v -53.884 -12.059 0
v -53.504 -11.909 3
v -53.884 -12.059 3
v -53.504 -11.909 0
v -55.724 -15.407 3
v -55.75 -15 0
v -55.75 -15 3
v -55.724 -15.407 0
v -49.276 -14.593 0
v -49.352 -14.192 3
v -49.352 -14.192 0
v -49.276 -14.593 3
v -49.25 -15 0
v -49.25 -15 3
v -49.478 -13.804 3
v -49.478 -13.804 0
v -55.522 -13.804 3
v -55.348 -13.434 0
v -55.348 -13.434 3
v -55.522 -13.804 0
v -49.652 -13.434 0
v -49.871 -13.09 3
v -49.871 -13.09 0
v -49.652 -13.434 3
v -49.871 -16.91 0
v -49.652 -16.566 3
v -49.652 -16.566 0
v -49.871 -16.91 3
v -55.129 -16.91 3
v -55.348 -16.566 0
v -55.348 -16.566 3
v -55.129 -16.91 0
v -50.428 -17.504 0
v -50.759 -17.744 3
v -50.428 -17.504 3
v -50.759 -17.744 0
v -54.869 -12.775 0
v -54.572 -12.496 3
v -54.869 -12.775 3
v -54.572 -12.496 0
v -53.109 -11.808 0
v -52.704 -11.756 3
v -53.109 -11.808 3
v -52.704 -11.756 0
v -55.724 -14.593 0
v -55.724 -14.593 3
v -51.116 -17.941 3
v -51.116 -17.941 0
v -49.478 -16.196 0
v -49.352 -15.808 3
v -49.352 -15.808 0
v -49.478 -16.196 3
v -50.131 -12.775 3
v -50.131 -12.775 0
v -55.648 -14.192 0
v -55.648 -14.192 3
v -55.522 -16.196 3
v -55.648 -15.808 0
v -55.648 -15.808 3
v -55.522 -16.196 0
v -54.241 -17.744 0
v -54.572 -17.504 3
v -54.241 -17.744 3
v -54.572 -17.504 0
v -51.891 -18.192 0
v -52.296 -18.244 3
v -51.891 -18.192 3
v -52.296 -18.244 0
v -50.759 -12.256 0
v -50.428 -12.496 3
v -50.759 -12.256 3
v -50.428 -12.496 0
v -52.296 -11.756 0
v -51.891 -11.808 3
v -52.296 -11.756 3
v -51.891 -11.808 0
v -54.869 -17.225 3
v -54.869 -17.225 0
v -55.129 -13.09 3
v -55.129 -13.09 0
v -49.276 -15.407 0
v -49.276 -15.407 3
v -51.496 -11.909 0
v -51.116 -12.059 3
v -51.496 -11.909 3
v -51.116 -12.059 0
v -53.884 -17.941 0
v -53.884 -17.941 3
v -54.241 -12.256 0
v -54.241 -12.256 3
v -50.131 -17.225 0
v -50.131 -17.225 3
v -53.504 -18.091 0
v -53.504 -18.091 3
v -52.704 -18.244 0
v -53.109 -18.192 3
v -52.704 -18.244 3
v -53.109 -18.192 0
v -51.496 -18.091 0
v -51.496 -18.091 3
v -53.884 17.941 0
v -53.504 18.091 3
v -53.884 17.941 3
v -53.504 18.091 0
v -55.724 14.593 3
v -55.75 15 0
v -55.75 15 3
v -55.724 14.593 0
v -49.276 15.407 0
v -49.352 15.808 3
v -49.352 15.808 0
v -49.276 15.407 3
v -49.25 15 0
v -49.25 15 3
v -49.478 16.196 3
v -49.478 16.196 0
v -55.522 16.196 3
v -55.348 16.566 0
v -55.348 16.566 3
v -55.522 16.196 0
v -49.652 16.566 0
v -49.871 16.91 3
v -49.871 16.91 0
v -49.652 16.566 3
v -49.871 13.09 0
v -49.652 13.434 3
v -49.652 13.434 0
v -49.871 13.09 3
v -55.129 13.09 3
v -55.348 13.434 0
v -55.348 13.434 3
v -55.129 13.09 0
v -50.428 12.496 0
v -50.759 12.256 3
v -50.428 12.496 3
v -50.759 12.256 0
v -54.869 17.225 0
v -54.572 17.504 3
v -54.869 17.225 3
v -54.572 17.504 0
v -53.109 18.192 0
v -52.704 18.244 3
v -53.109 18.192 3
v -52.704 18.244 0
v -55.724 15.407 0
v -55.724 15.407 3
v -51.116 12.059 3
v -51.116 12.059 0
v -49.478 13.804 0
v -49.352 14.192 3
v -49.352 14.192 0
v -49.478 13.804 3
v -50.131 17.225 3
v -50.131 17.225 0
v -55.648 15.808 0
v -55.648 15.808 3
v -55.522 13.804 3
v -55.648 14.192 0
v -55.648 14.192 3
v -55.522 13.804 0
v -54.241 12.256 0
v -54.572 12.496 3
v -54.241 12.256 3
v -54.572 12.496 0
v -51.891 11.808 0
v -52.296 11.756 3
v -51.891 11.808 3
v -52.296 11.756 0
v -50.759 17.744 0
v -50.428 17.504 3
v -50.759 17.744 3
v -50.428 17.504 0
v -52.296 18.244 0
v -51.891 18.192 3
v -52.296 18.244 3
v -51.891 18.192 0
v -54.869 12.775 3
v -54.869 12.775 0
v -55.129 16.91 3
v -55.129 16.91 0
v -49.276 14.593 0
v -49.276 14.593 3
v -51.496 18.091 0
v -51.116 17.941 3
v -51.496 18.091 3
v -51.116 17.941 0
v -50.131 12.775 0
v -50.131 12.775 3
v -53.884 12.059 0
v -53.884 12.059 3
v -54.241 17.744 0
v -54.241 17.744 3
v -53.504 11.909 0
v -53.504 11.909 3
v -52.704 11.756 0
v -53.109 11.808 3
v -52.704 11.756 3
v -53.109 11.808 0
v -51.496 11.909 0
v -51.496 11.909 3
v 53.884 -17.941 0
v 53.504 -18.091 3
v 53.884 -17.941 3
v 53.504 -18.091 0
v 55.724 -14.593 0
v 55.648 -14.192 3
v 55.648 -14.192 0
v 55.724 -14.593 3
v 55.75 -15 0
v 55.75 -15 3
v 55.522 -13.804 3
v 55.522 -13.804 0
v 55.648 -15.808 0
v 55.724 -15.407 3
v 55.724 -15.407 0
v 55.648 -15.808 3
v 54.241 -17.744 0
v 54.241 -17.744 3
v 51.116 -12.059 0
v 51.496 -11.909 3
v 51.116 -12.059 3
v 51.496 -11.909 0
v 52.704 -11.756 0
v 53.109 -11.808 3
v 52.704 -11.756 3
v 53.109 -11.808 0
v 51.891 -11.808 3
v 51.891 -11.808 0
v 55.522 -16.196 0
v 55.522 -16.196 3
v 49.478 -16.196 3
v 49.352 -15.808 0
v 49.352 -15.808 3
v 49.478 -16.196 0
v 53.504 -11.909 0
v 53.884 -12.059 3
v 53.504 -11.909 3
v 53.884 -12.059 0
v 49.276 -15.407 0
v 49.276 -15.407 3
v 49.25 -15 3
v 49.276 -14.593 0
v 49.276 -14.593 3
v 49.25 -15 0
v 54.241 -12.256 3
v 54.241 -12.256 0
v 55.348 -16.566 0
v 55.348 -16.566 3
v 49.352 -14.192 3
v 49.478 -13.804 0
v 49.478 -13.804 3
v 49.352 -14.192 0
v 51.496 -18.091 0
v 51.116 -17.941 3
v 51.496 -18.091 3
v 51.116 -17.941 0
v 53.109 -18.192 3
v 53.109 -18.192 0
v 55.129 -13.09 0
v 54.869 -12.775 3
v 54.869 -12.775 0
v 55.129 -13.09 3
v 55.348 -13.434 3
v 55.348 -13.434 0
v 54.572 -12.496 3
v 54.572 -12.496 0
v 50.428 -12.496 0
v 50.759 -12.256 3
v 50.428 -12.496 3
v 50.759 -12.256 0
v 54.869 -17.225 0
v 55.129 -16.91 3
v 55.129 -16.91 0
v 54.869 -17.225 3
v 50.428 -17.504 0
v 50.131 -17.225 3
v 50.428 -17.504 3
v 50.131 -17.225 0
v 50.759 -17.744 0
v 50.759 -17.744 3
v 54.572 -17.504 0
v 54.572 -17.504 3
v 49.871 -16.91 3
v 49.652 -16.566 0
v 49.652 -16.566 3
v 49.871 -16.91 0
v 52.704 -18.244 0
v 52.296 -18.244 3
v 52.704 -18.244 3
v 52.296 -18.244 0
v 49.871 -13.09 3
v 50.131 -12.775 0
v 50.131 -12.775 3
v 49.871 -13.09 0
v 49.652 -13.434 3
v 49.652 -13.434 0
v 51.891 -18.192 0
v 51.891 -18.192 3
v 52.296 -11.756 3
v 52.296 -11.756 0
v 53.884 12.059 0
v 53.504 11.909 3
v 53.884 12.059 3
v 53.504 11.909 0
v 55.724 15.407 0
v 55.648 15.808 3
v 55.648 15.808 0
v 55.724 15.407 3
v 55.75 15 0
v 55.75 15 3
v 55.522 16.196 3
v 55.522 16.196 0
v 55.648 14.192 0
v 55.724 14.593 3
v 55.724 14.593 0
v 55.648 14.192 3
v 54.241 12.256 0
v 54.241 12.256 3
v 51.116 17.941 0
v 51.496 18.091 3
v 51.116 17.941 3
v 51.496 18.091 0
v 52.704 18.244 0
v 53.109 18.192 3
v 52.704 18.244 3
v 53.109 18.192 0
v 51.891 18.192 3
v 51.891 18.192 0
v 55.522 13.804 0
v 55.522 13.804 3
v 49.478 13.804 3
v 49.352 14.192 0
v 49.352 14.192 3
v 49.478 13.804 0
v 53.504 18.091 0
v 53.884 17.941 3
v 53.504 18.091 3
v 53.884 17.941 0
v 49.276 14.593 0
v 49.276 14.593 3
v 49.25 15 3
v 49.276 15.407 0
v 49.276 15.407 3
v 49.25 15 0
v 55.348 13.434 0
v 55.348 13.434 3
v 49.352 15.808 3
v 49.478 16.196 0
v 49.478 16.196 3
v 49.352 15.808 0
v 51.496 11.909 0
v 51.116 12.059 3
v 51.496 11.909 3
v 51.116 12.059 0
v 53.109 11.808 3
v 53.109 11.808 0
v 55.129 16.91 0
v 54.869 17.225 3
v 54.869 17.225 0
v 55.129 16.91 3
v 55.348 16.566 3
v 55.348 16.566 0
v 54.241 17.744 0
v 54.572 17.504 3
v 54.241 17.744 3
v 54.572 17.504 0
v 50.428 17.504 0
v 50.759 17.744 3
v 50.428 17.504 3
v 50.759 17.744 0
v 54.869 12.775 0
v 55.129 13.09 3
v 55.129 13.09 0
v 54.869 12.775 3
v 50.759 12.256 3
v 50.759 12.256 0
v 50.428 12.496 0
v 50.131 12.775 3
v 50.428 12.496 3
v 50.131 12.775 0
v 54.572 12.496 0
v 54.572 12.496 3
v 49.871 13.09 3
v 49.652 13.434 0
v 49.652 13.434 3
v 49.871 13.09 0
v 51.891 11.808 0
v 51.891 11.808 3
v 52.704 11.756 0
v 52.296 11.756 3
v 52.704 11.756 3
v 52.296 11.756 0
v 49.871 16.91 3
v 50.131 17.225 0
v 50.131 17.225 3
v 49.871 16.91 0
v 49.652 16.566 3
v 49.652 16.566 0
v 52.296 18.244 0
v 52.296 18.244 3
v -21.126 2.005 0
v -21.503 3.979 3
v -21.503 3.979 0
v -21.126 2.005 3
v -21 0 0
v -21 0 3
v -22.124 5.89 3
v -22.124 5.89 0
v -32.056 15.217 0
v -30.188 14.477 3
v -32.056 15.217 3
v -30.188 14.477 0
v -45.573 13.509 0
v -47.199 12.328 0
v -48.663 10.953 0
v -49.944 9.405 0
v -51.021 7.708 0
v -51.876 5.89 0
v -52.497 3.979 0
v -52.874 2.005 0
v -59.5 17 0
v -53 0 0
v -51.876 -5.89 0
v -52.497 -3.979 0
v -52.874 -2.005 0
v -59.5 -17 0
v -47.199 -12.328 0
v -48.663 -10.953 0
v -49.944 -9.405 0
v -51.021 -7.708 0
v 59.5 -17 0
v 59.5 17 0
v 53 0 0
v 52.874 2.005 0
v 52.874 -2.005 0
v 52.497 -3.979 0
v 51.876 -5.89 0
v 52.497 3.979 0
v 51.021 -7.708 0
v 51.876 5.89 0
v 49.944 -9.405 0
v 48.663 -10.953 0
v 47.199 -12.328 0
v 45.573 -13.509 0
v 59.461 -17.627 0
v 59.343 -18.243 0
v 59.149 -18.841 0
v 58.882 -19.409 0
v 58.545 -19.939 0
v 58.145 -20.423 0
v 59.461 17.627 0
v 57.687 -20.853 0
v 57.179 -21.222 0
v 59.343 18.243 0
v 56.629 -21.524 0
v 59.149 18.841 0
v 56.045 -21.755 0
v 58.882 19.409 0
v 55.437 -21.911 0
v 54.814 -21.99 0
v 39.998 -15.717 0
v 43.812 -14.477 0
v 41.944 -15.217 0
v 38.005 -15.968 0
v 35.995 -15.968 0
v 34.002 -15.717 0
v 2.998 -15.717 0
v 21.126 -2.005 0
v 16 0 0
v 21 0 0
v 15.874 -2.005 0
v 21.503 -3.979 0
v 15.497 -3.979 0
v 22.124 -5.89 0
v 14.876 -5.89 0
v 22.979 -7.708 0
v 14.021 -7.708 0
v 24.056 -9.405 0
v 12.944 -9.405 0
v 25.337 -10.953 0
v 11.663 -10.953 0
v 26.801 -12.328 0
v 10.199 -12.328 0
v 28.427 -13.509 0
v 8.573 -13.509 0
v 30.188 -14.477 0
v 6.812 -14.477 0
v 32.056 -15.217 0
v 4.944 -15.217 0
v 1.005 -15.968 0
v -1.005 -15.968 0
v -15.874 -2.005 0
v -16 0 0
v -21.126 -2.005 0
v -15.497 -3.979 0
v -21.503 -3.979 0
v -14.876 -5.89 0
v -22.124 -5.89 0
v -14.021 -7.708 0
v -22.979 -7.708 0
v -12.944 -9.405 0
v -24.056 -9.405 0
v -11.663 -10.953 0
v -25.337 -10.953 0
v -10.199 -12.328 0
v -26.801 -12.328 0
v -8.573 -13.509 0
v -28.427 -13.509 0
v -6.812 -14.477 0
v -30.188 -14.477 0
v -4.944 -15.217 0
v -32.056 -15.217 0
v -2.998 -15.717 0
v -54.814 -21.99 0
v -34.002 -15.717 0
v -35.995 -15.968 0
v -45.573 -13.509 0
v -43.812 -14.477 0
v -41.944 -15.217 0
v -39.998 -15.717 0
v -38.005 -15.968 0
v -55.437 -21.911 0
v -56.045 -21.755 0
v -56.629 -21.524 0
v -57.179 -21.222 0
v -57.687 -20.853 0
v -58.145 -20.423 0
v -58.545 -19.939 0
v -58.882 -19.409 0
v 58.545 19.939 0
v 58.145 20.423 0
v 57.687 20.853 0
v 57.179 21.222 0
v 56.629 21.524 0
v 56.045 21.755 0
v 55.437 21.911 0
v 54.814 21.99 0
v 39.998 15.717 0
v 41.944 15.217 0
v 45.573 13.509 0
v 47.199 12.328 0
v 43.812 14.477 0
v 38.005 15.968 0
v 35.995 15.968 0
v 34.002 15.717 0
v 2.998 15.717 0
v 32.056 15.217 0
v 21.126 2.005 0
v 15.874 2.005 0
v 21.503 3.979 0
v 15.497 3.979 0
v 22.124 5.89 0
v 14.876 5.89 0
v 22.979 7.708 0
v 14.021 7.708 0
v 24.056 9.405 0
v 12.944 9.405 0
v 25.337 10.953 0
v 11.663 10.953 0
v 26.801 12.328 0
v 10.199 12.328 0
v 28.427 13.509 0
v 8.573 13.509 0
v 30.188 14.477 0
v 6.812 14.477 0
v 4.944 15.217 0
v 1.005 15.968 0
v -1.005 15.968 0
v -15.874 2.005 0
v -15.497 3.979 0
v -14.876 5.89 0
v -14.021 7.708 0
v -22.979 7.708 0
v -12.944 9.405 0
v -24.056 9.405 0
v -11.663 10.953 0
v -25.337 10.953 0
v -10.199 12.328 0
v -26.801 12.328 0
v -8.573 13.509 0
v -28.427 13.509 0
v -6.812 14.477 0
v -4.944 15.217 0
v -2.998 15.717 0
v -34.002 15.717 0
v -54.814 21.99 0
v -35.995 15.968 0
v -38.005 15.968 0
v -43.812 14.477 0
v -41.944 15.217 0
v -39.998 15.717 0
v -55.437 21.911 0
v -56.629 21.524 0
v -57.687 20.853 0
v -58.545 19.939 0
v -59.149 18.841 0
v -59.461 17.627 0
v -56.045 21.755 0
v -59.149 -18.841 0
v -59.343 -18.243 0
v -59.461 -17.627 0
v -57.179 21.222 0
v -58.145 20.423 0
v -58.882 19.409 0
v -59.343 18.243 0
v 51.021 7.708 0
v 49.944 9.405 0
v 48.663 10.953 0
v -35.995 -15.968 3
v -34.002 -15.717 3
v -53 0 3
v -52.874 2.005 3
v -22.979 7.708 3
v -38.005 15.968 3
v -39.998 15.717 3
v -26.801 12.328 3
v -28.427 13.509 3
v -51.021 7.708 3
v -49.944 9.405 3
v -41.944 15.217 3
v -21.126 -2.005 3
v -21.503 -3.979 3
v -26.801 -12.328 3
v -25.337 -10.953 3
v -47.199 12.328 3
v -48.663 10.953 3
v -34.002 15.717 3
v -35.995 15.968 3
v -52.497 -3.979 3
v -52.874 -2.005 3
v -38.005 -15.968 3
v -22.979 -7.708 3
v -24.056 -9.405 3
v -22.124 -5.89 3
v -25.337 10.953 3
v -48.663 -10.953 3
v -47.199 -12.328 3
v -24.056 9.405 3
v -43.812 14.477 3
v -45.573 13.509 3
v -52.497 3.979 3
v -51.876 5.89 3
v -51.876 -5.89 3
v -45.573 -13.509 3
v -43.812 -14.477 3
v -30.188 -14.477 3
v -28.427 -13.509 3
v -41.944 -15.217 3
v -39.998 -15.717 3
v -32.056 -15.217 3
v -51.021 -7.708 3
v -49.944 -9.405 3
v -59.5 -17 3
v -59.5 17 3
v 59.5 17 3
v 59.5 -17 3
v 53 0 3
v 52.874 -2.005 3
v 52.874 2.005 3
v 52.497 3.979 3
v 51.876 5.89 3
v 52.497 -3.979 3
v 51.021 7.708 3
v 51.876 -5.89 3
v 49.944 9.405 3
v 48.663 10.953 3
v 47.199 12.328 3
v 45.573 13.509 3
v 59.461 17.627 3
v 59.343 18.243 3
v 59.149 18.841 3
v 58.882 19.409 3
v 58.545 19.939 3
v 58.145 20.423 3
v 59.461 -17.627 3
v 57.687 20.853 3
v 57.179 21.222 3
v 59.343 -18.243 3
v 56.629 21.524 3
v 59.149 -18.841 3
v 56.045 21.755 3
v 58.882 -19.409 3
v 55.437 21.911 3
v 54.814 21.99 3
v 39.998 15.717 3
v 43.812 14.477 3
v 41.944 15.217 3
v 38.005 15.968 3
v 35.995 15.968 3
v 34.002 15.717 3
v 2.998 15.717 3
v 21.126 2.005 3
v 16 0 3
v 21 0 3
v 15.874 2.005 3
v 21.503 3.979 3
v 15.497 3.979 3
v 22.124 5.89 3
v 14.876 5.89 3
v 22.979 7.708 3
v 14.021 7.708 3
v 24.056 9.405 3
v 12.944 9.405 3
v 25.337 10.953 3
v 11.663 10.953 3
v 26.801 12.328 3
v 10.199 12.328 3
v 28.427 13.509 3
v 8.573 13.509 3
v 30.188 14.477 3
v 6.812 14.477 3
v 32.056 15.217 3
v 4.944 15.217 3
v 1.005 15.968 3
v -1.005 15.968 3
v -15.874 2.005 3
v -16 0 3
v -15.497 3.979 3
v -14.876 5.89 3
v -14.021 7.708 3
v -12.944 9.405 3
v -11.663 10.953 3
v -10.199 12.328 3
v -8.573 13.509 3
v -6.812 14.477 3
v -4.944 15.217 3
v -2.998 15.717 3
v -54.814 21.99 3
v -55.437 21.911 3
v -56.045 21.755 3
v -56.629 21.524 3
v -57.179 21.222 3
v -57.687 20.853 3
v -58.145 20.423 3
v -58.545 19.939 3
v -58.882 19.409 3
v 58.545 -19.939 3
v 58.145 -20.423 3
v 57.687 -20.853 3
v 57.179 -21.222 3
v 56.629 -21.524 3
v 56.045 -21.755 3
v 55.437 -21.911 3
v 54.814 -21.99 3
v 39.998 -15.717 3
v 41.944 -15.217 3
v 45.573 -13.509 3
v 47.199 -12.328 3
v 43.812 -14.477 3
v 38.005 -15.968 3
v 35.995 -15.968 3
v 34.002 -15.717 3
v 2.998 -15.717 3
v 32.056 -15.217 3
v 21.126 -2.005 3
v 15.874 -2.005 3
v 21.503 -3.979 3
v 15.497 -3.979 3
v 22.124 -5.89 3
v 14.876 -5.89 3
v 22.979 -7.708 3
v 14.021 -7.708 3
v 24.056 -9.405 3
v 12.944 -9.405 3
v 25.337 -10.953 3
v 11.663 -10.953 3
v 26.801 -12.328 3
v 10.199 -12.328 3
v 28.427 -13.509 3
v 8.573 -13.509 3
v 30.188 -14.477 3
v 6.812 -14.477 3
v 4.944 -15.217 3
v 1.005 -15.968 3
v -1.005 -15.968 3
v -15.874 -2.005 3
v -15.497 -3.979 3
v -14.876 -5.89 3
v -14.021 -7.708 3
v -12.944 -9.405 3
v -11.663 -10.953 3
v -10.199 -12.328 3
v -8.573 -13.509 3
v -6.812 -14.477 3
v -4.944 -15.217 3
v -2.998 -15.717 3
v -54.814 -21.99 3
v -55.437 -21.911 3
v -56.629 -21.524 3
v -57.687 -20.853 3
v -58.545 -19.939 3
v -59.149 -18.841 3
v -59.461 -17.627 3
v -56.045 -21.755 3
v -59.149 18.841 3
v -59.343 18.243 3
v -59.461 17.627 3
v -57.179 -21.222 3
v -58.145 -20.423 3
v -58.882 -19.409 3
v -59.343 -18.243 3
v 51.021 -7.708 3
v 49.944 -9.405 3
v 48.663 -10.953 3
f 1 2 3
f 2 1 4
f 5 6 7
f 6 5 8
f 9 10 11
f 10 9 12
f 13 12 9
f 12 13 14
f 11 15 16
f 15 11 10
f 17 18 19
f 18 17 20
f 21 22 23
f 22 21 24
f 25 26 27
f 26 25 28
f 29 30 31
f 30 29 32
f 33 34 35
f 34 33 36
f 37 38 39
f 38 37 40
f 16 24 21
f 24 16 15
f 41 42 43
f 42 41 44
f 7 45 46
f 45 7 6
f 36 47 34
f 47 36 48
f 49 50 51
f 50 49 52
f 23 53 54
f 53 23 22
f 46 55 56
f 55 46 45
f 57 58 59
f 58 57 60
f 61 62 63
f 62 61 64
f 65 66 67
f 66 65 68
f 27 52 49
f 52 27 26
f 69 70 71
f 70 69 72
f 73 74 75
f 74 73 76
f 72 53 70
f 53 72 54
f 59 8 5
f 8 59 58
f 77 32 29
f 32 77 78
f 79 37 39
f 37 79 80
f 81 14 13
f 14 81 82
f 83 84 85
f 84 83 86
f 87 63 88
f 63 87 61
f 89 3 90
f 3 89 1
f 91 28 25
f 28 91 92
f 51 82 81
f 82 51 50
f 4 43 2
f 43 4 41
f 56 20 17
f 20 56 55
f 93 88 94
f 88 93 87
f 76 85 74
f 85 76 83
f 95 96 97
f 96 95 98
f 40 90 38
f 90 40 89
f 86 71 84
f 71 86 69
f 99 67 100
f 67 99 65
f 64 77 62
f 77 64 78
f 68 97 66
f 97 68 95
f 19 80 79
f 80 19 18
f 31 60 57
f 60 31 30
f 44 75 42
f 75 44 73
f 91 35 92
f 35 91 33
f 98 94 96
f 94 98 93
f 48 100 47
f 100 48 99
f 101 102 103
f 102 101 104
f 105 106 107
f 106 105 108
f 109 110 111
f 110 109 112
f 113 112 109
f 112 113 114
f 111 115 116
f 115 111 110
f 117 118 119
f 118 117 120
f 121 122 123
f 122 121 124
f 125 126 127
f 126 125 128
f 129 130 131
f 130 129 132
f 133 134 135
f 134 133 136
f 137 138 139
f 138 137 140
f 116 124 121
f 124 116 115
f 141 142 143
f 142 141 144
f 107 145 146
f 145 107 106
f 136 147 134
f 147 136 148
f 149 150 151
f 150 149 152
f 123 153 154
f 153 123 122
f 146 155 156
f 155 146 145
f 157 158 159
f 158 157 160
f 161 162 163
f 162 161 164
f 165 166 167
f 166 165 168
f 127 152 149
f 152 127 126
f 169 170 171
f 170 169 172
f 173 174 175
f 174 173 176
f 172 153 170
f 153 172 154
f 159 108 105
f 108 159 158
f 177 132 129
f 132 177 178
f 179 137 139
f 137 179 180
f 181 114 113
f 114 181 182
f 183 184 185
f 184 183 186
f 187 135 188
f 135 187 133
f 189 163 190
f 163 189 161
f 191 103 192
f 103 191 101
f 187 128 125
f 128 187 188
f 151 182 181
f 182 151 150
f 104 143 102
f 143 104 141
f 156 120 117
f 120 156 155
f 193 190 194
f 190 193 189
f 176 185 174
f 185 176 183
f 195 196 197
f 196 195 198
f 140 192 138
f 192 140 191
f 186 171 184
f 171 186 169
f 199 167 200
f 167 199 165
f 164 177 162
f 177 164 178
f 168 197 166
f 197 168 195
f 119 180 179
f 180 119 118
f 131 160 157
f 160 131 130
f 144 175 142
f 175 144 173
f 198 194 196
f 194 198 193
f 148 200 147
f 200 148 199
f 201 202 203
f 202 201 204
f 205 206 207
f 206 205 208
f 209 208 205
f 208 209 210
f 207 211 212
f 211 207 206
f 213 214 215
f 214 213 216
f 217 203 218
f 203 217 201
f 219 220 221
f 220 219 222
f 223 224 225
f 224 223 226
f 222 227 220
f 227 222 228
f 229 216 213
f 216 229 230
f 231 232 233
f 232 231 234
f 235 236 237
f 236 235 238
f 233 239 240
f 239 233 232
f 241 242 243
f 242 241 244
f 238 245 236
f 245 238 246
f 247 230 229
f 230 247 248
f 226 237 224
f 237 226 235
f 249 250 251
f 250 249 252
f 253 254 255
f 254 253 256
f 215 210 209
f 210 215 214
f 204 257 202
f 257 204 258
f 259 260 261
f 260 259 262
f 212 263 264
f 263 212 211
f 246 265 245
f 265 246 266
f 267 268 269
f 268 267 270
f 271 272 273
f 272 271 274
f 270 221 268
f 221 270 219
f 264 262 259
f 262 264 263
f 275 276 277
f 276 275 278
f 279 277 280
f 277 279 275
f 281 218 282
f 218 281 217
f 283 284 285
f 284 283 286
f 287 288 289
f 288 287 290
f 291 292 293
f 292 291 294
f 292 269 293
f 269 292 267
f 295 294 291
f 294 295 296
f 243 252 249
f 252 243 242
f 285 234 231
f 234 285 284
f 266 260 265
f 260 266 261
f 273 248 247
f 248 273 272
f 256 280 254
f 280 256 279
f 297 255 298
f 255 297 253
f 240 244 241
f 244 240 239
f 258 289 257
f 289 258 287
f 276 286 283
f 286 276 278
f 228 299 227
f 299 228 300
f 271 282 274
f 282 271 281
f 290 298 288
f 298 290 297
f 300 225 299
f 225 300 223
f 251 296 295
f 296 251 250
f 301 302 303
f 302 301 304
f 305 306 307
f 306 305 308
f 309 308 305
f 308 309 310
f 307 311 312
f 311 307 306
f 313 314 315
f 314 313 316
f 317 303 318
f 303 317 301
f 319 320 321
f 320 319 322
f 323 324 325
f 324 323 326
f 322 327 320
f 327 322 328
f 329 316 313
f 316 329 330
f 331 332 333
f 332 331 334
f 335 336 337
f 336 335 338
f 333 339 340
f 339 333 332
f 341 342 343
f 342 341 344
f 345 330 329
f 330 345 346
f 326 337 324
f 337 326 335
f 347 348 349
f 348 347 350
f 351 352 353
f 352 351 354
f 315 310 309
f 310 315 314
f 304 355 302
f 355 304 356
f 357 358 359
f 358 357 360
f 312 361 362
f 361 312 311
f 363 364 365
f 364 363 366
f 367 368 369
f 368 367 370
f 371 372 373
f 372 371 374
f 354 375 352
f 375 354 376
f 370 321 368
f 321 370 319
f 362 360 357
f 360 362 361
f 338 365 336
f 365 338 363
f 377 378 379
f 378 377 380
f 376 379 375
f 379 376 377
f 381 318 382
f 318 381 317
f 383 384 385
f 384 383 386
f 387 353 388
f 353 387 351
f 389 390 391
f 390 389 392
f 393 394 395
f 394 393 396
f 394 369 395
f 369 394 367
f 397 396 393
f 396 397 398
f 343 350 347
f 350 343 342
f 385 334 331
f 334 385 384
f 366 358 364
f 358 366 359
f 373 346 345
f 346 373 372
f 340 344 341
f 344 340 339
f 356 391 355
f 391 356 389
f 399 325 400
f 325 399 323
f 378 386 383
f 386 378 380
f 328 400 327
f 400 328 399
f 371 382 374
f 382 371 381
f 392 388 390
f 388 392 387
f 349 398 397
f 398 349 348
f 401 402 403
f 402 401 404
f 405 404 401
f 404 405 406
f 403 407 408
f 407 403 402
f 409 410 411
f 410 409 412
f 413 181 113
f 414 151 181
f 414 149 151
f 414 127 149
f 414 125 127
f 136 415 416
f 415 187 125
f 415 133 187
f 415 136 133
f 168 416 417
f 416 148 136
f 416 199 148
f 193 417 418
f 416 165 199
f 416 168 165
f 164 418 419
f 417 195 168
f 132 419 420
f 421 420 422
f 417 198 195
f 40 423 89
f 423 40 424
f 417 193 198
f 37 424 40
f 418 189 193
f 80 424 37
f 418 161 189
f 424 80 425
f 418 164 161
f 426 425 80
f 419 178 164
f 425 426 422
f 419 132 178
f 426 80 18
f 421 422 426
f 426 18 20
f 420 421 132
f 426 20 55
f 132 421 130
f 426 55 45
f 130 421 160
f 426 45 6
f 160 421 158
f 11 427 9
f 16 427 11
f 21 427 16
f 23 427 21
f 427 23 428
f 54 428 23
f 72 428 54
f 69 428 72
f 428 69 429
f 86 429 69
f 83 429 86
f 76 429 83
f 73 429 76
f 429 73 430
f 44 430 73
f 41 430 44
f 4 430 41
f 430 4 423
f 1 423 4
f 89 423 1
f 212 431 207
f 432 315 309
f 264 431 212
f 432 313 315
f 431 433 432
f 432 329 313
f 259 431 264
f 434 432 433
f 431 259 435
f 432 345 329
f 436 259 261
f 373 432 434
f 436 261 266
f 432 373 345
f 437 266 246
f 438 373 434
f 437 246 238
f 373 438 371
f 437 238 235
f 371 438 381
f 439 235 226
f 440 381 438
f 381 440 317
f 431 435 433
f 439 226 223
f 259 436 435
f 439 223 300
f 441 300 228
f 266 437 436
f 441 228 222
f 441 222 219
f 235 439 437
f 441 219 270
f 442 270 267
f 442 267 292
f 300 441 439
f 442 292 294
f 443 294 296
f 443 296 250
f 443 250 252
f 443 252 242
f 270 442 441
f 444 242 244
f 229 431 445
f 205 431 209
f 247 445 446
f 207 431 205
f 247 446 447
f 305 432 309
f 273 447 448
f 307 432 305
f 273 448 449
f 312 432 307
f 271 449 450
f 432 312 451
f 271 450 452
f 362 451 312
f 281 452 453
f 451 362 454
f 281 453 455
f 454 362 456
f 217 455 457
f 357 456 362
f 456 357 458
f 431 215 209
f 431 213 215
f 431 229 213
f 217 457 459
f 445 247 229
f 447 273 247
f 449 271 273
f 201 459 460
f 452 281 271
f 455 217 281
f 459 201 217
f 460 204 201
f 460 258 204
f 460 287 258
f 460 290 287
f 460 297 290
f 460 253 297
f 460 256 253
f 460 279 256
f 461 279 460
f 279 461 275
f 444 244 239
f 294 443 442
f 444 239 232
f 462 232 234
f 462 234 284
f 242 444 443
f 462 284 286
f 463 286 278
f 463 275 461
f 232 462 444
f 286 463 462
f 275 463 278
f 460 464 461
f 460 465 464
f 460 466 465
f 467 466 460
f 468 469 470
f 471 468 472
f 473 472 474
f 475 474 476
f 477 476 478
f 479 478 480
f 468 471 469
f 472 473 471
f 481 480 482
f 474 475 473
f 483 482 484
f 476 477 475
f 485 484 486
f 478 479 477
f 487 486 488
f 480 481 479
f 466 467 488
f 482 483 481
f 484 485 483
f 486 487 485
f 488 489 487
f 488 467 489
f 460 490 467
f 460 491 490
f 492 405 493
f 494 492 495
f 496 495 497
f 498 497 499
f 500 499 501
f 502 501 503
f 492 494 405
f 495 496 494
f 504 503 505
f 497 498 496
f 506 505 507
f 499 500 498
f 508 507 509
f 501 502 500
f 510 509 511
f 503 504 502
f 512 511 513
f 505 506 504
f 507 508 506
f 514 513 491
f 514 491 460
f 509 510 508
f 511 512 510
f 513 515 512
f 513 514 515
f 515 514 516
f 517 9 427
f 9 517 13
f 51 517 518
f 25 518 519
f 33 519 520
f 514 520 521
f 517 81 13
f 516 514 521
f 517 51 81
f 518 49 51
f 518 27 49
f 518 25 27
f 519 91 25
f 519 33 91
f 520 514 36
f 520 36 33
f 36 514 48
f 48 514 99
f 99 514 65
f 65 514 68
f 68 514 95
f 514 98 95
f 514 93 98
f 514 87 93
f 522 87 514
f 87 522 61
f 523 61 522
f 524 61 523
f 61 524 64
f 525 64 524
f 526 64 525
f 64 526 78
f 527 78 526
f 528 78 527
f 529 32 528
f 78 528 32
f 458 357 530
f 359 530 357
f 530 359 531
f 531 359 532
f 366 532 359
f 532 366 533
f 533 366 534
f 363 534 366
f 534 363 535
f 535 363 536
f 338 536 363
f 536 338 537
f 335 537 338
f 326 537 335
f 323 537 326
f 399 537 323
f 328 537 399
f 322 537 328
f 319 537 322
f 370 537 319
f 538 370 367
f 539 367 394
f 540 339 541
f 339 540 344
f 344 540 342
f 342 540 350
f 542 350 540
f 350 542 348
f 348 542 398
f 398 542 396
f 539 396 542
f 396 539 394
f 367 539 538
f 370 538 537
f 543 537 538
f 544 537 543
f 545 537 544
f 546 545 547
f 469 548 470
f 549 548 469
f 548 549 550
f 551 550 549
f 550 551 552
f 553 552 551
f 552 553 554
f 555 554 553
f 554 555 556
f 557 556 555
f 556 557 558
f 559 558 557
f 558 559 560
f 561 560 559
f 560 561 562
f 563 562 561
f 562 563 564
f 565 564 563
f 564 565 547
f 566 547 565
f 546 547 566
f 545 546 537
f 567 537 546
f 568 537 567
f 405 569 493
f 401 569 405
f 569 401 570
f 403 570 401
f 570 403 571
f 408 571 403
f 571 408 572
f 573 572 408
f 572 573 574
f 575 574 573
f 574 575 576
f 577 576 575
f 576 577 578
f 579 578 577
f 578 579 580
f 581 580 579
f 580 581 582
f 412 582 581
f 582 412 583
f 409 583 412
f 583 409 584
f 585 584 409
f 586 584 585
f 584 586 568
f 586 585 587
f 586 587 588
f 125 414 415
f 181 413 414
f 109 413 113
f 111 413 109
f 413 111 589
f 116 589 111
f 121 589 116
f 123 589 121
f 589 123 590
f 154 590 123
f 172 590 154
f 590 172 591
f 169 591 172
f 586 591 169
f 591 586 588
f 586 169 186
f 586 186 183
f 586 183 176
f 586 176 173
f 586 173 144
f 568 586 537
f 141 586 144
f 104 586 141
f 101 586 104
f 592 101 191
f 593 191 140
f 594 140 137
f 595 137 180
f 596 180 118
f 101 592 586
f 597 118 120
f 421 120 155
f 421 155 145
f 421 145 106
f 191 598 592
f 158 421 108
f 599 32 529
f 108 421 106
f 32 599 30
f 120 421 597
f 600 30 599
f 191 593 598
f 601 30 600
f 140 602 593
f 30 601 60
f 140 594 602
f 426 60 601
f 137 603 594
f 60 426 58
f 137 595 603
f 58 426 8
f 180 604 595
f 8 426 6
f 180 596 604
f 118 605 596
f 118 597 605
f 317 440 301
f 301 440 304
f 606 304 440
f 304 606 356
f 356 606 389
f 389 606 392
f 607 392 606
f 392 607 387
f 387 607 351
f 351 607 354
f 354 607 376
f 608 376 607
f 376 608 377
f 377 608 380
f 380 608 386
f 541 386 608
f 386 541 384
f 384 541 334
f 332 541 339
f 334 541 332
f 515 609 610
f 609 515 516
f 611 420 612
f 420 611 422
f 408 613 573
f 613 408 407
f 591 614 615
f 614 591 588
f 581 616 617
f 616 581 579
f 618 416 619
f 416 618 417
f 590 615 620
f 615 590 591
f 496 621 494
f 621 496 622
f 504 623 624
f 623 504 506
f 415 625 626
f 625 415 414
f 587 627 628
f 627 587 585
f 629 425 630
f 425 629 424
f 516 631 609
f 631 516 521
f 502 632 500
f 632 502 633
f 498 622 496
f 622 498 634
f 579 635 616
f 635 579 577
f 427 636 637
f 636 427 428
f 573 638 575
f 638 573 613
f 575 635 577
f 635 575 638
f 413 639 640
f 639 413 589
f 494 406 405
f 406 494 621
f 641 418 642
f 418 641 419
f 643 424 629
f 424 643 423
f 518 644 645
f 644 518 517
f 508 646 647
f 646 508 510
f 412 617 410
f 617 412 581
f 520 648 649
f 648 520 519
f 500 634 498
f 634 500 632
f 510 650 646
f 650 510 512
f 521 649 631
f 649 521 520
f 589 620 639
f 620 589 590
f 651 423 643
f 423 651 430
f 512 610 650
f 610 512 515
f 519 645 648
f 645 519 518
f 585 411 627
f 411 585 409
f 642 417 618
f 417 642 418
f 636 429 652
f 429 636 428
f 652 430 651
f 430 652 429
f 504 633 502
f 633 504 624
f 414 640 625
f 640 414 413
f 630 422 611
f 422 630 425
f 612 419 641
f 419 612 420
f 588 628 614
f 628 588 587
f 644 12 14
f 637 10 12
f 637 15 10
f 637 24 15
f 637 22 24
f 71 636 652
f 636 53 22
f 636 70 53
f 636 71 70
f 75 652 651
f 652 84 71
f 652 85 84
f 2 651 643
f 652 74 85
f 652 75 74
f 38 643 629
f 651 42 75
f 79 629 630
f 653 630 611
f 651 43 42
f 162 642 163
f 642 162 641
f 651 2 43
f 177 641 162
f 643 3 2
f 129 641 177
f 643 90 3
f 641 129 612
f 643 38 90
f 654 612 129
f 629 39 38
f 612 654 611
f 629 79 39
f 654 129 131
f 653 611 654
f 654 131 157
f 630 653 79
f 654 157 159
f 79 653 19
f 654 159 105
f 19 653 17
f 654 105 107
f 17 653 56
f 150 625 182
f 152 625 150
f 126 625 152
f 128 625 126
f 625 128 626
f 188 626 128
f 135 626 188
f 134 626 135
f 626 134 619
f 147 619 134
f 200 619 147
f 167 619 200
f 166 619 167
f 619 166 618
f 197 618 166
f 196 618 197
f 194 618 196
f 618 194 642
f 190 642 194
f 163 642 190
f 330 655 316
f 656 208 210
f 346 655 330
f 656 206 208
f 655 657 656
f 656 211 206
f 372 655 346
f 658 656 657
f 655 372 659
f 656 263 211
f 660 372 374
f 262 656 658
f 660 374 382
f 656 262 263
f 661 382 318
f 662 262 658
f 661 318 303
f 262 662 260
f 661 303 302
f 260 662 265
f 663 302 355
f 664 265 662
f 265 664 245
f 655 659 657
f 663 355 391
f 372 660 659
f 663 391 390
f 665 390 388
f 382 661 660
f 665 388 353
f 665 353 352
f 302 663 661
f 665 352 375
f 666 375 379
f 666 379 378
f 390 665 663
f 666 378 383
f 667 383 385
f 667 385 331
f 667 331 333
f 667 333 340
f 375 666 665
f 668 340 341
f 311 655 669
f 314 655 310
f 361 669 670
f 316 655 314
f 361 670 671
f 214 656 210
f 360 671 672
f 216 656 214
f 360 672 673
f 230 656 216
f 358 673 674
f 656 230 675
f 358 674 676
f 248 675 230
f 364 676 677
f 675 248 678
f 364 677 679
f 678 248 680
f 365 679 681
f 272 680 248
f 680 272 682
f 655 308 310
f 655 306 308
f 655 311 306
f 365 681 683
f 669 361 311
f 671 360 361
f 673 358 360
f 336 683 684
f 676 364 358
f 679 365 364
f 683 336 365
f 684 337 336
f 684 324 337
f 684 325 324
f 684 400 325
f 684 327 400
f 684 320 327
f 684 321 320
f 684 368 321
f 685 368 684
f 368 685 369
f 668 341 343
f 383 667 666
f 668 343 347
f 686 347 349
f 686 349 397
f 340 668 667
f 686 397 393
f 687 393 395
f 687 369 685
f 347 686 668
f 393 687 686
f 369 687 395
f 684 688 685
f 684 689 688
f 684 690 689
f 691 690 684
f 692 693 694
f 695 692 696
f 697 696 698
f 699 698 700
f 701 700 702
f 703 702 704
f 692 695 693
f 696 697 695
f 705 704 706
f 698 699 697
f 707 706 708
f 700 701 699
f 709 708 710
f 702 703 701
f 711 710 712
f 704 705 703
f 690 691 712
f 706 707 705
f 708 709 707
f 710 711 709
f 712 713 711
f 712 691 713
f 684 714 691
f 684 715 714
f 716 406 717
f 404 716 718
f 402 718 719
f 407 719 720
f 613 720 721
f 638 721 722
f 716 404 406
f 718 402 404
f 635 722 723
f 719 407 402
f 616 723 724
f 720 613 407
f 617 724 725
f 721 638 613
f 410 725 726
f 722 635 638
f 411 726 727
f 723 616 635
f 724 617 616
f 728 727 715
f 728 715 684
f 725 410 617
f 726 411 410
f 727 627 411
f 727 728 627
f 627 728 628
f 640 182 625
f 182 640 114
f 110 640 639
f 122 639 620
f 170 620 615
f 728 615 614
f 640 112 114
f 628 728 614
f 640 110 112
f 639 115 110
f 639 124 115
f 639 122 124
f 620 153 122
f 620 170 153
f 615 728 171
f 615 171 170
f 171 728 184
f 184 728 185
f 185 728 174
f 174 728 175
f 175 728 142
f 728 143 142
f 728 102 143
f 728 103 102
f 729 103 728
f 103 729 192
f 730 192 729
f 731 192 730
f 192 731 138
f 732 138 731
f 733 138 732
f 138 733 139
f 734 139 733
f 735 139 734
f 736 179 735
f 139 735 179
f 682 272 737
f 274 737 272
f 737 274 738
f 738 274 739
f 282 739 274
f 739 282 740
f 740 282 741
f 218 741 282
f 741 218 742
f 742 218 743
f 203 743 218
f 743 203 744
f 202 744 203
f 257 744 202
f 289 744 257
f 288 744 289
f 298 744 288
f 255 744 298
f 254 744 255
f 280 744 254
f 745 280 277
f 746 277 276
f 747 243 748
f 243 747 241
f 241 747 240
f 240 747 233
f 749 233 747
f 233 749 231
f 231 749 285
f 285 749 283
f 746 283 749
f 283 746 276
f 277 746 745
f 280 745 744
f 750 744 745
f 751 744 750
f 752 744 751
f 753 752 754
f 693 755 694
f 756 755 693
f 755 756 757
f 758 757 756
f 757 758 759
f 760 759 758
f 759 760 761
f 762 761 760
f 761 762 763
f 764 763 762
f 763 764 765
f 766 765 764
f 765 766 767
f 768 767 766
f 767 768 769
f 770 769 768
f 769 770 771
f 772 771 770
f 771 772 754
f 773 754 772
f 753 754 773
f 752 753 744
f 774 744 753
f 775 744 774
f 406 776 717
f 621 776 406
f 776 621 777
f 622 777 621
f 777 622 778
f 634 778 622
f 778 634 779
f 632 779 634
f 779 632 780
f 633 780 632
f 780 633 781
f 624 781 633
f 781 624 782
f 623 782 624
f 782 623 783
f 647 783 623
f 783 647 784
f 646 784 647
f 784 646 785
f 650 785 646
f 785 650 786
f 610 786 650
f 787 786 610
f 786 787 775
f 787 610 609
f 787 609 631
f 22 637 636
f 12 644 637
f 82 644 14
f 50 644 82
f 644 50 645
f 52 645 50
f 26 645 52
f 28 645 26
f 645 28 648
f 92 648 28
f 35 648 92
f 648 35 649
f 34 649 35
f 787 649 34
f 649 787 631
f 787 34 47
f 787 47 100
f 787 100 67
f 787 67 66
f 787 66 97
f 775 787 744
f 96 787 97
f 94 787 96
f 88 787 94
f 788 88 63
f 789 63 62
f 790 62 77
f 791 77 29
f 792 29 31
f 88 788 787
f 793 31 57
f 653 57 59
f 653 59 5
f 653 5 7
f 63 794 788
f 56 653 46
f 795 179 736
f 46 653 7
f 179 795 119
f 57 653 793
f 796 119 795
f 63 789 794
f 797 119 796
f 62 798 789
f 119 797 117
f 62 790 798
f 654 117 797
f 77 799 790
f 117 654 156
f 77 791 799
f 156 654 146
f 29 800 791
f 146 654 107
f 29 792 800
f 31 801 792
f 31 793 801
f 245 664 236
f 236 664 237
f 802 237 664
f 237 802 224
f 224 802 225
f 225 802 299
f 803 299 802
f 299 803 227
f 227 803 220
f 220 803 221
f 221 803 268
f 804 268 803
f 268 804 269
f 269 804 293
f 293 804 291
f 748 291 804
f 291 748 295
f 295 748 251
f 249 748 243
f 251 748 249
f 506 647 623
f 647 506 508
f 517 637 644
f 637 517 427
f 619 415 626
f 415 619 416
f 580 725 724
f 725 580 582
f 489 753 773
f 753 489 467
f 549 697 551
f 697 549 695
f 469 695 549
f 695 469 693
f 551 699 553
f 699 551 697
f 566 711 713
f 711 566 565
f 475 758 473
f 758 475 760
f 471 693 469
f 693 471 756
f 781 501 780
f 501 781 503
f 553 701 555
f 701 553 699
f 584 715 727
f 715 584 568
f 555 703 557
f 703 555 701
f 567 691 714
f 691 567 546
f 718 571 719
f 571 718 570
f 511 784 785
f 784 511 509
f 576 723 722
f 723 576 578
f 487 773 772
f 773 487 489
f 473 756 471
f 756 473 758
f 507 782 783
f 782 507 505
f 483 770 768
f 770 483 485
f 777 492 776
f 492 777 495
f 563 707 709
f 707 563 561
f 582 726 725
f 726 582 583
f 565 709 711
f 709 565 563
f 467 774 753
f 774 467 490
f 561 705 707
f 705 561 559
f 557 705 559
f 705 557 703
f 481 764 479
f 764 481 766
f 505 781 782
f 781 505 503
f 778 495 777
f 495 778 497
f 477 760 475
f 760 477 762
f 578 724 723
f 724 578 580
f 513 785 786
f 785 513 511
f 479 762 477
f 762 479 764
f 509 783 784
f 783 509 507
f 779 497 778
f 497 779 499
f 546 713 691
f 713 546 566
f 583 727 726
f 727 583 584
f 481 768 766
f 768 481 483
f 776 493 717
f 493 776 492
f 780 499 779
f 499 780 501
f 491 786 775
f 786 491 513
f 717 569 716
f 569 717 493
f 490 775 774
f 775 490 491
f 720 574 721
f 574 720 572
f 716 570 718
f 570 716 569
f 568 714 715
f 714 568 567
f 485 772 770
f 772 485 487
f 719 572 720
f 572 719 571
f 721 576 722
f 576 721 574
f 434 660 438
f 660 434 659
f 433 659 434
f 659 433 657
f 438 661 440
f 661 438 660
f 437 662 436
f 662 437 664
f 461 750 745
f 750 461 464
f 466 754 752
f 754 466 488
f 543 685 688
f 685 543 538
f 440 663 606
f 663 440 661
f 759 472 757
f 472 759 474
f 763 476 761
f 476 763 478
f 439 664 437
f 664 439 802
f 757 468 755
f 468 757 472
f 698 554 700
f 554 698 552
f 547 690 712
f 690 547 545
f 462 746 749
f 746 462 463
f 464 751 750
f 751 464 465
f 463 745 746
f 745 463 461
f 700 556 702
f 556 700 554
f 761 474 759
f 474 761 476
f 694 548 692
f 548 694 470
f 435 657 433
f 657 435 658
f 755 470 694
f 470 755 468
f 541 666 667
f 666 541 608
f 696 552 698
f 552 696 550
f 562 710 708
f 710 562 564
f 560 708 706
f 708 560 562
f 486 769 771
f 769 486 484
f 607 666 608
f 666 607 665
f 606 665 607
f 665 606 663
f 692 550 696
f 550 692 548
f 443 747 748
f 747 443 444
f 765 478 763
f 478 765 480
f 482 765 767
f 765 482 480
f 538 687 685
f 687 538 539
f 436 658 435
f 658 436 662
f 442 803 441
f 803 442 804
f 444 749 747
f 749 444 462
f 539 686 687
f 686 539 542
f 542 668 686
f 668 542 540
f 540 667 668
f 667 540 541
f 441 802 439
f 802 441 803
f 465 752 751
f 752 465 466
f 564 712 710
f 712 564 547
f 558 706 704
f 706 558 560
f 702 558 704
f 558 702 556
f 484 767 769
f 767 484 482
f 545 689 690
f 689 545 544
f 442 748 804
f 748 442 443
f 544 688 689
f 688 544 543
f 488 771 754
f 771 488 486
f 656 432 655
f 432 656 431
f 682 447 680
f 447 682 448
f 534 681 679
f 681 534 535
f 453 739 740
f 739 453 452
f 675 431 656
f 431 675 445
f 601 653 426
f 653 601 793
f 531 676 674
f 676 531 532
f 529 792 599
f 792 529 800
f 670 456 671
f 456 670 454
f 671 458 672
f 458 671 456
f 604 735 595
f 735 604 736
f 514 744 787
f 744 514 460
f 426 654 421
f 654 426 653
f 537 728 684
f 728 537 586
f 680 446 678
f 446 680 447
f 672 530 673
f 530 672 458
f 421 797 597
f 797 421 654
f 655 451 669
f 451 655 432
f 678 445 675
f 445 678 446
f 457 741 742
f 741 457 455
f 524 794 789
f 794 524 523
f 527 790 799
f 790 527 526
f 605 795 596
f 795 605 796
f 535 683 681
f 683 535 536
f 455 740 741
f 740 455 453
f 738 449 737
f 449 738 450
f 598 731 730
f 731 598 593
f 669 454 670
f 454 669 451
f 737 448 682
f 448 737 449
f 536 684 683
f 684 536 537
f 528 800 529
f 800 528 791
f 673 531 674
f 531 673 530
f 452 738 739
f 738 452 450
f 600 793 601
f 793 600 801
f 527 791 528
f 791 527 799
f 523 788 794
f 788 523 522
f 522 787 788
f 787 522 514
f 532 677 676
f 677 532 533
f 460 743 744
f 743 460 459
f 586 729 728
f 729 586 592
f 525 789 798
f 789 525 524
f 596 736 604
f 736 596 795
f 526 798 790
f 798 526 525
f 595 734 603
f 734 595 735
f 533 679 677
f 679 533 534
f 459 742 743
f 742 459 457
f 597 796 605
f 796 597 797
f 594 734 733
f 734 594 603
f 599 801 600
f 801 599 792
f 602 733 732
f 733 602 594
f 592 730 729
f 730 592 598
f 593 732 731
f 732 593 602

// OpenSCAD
$fn = 50;


difference() {
	union() {
		hull() {
			translate(v = [-54.5000000000, 17.0000000000, 0]) {
				cylinder(h = 3, r = 5);
			}
			translate(v = [54.5000000000, 17.0000000000, 0]) {
				cylinder(h = 3, r = 5);
			}
			translate(v = [-54.5000000000, -17.0000000000, 0]) {
				cylinder(h = 3, r = 5);
			}
			translate(v = [54.5000000000, -17.0000000000, 0]) {
				cylinder(h = 3, r = 5);
			}
		}
	}
	union() {
		#translate(v = [-52.5000000000, -15.0000000000, -100.0000000000]) {
			cylinder(h = 200, r = 3.2500000000);
		}
		#translate(v = [-52.5000000000, 15.0000000000, -100.0000000000]) {
			cylinder(h = 200, r = 3.2500000000);
		}
		#translate(v = [52.5000000000, -15.0000000000, -100.0000000000]) {
			cylinder(h = 200, r = 3.2500000000);
		}
		#translate(v = [52.5000000000, 15.0000000000, -100.0000000000]) {
			cylinder(h = 200, r = 3.2500000000);
		}
		#translate(v = [-37.0000000000, 0, 0]) {
			cylinder(h = 3, r = 16.0000000000);
		}
		#cylinder(h = 3, r = 16.0000000000);
		#translate(v = [37.0000000000, 0, 0]) {
			cylinder(h = 3, r = 16.0000000000);
		}
	}
}
